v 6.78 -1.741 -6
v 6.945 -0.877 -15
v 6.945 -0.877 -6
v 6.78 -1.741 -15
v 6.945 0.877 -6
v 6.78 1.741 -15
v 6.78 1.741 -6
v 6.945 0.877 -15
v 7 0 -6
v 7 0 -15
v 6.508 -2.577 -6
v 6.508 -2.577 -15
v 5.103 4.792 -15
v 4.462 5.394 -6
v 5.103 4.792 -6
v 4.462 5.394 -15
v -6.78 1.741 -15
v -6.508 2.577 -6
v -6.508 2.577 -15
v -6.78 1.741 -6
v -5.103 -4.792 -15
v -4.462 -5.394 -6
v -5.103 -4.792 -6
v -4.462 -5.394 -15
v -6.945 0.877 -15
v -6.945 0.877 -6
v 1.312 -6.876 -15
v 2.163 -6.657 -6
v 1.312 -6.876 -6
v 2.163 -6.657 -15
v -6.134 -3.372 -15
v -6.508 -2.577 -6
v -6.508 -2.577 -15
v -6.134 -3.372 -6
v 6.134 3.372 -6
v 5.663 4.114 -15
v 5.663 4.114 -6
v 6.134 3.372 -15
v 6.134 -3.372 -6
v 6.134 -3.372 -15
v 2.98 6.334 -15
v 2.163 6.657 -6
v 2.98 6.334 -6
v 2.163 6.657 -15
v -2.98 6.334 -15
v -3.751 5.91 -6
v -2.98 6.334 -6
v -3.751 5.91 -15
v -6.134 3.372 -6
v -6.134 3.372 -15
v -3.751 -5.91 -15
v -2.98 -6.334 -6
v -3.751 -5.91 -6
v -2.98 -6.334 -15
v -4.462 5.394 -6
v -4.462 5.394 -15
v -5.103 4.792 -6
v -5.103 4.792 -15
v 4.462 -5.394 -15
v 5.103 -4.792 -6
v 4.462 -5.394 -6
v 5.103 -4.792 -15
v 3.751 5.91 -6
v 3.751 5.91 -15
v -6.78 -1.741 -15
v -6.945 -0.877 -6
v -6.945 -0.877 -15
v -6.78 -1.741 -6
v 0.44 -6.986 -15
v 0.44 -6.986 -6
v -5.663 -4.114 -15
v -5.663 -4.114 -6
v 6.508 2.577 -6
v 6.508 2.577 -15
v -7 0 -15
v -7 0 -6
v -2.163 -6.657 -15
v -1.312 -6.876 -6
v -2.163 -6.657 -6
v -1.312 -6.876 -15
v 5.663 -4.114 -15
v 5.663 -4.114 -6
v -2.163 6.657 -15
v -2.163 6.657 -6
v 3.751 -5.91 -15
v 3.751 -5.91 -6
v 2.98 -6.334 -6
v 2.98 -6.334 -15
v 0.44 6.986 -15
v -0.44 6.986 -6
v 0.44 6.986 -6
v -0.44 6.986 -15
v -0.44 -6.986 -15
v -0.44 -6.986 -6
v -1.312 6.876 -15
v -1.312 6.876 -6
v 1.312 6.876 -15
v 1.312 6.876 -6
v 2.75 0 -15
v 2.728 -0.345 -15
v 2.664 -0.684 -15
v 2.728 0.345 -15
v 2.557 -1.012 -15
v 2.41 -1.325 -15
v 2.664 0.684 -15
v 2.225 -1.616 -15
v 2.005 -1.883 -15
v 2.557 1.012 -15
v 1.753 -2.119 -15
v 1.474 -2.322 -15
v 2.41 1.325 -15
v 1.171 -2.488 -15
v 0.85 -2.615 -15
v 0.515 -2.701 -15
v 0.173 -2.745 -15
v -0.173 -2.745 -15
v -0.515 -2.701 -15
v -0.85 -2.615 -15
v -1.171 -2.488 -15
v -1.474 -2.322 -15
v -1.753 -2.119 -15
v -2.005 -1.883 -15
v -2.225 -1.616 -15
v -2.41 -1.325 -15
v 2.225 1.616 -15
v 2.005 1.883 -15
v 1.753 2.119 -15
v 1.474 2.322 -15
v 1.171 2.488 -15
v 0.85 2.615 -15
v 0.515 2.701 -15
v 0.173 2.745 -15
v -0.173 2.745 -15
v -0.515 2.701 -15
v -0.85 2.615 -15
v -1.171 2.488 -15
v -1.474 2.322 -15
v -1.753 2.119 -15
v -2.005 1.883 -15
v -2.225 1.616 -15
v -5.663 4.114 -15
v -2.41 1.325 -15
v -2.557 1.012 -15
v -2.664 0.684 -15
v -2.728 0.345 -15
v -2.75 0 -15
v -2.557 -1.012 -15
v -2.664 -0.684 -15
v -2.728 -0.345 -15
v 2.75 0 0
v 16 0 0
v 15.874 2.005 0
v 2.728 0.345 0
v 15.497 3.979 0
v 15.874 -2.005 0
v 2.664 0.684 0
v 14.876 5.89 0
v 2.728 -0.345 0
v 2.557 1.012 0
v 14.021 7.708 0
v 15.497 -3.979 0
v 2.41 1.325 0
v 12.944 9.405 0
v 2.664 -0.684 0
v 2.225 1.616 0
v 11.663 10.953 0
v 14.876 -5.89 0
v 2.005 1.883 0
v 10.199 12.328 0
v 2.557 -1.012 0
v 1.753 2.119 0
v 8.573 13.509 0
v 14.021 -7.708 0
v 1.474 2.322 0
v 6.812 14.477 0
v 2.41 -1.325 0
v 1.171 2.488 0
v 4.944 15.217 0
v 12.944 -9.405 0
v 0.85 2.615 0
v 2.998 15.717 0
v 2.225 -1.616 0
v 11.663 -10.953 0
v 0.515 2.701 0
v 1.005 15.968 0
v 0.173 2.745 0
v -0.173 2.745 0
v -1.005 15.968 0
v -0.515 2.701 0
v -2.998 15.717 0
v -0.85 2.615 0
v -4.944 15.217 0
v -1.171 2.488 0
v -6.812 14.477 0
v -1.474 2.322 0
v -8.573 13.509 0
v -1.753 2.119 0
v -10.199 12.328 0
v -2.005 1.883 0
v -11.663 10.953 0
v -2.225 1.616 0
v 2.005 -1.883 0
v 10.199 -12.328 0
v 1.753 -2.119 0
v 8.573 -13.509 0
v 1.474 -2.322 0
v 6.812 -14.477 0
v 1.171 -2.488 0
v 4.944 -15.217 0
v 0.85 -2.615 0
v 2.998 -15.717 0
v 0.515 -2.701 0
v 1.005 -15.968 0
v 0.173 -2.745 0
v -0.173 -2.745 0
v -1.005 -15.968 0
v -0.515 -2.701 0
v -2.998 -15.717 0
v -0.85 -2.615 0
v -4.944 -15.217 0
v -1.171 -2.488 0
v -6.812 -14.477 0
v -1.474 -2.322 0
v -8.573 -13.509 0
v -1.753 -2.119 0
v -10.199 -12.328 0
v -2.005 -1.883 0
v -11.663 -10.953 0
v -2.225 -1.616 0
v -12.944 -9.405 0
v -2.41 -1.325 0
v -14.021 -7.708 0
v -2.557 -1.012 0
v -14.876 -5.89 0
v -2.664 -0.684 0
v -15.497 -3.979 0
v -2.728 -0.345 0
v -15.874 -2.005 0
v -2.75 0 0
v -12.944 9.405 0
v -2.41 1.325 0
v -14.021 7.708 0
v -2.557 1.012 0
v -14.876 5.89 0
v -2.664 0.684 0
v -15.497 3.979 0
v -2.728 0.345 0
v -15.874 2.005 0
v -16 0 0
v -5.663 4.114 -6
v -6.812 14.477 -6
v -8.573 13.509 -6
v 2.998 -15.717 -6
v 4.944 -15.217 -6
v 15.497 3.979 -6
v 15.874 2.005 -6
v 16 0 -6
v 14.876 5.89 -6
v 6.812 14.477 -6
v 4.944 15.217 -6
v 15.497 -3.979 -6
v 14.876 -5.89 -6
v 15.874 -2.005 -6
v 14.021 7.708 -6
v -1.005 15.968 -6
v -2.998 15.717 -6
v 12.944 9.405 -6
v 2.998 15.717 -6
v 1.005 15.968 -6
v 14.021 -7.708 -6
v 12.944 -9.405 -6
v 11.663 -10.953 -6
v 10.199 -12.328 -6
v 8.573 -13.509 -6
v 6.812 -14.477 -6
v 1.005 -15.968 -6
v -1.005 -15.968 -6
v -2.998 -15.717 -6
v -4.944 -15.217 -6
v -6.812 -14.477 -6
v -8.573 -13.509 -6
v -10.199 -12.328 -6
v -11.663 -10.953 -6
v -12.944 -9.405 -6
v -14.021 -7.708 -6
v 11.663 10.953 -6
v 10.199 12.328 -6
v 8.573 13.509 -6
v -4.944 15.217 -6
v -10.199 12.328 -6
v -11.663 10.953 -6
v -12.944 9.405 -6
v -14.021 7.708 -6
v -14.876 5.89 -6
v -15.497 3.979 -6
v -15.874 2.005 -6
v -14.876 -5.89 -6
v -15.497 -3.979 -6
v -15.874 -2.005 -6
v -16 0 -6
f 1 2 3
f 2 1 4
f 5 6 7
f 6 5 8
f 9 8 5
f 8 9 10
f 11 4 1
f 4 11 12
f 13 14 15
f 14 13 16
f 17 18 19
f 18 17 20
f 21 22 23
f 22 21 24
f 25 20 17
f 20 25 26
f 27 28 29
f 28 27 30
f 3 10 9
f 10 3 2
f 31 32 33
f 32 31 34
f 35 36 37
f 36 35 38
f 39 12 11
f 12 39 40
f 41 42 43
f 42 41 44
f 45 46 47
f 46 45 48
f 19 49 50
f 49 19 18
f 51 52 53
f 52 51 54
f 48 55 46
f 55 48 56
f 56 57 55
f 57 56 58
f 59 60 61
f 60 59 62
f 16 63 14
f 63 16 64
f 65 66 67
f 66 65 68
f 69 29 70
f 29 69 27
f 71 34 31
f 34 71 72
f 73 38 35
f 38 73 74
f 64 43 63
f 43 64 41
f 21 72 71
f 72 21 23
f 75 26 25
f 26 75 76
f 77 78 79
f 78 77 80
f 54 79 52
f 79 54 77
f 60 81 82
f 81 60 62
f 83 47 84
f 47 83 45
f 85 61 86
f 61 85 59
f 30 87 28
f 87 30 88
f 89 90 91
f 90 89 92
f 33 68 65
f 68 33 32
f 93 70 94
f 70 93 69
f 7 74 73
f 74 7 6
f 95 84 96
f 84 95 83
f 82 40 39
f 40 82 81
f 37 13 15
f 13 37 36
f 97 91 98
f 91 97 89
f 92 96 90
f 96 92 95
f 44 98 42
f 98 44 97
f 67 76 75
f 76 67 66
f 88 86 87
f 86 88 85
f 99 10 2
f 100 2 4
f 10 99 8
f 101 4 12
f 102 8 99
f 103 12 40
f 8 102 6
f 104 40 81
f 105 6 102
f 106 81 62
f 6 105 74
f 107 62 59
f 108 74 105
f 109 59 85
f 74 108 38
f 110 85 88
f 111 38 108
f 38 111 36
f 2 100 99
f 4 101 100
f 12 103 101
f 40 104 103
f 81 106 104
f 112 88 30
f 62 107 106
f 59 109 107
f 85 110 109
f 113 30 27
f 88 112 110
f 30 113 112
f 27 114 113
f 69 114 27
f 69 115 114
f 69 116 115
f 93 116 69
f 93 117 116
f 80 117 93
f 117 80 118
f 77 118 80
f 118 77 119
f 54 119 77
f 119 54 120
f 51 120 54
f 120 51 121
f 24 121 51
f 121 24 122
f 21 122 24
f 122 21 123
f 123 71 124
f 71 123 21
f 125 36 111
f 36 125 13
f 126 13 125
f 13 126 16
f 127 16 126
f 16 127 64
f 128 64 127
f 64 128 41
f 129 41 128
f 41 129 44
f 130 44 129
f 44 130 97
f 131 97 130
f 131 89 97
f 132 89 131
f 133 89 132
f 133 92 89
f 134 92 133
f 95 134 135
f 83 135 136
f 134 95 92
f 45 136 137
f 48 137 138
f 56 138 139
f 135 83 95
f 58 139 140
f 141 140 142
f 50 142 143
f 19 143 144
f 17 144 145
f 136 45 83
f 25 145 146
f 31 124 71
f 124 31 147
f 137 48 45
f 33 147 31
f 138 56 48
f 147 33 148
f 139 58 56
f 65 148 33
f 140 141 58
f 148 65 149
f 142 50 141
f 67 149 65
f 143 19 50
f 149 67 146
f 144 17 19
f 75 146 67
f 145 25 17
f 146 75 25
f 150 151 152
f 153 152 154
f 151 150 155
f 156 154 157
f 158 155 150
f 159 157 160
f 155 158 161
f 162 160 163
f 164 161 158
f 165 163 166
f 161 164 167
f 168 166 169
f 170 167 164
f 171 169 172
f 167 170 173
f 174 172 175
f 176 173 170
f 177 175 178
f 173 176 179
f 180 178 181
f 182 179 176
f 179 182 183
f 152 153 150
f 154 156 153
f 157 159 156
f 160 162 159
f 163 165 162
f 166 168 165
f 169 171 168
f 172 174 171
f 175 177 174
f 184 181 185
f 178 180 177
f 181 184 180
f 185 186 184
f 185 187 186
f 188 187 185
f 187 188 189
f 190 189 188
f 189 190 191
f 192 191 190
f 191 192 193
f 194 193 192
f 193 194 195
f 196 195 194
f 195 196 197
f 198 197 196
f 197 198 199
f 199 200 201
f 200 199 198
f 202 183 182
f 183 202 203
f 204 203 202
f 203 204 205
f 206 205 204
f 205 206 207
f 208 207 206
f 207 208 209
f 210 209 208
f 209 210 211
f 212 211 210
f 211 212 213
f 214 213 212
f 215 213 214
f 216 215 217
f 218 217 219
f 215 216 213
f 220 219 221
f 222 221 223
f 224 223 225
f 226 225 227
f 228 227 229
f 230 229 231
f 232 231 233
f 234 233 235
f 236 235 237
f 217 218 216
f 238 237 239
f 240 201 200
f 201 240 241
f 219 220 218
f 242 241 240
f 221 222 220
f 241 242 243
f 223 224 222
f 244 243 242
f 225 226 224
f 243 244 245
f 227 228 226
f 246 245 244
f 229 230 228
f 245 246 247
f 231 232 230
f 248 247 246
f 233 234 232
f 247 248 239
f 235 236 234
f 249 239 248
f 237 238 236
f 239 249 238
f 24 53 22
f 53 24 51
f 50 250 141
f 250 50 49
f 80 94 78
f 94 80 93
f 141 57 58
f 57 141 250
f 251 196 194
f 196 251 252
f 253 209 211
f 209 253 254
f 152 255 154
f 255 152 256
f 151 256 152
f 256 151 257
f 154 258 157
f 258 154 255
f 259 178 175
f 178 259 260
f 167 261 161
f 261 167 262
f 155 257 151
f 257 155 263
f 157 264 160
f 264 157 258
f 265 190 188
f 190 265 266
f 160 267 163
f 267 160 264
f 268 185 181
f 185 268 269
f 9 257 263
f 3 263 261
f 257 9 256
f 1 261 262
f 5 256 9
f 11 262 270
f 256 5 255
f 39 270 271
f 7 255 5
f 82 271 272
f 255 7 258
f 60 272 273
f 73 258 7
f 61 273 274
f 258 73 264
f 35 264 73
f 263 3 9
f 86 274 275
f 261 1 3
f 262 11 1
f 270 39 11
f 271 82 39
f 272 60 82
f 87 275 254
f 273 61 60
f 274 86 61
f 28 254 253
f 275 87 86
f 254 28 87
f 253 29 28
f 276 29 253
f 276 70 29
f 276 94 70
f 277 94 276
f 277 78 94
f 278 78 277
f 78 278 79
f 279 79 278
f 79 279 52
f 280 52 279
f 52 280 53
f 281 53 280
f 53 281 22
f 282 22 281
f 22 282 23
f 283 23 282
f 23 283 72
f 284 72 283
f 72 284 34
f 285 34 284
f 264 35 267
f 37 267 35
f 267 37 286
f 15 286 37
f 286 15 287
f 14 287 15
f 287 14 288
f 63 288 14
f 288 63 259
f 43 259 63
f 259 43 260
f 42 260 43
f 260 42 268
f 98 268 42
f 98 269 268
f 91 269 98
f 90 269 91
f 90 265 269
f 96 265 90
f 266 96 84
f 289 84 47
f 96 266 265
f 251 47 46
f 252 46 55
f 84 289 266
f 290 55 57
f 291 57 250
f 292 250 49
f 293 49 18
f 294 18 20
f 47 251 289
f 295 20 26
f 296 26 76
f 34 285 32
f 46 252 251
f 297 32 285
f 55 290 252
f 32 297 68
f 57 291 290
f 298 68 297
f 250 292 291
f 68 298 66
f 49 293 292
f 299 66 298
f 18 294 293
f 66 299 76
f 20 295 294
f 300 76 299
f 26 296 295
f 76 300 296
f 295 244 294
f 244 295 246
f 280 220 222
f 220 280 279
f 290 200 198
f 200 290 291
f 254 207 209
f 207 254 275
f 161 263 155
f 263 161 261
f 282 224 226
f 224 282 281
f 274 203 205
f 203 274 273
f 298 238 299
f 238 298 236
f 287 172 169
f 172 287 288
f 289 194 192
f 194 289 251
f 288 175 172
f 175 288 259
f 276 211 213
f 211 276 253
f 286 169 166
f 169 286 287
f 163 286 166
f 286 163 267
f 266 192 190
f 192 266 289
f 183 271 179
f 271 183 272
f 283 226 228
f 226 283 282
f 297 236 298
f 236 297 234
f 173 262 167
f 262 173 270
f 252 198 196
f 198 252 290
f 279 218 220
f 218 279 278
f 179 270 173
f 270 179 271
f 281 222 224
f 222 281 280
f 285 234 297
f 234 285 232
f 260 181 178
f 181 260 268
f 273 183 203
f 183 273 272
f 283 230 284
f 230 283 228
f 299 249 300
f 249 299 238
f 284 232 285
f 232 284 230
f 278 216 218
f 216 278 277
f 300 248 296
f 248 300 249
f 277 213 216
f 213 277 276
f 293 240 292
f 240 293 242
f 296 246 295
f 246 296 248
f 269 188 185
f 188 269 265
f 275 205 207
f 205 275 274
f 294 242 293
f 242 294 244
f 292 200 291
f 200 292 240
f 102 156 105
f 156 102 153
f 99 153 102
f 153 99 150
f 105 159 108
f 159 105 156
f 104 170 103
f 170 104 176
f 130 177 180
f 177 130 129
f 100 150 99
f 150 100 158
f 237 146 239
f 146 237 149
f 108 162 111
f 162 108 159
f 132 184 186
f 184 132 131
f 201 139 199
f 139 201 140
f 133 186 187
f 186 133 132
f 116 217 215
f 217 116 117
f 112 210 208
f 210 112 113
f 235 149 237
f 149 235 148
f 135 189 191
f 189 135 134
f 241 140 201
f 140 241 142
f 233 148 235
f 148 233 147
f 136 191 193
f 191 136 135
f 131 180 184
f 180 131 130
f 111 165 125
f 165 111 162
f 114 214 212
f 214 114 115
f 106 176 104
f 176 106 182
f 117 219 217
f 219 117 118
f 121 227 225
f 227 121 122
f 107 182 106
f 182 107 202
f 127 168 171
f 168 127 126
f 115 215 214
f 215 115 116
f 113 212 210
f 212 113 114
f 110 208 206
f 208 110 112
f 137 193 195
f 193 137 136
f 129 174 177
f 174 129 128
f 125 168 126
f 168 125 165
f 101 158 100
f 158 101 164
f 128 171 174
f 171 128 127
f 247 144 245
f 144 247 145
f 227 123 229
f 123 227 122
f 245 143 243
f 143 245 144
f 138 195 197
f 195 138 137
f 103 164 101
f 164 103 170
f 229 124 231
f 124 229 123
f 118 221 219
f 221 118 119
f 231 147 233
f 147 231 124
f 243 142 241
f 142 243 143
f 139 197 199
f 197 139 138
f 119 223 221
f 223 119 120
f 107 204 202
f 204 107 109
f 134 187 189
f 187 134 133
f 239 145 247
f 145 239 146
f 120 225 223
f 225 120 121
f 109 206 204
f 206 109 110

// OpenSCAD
$fn = 50;


difference() {
	union() {
		translate(v = [0, 0, -15.0000000000]) {
			cylinder(h = 15, r = 7.0000000000);
		}
		translate(v = [0, 0, -6.0000000000]) {
			cylinder(h = 6, r = 16.0000000000);
		}
	}
	union() {
		#translate(v = [0, 0, -15]) {
			cylinder(h = 15, r = 2.7500000000);
		}
	}
}
